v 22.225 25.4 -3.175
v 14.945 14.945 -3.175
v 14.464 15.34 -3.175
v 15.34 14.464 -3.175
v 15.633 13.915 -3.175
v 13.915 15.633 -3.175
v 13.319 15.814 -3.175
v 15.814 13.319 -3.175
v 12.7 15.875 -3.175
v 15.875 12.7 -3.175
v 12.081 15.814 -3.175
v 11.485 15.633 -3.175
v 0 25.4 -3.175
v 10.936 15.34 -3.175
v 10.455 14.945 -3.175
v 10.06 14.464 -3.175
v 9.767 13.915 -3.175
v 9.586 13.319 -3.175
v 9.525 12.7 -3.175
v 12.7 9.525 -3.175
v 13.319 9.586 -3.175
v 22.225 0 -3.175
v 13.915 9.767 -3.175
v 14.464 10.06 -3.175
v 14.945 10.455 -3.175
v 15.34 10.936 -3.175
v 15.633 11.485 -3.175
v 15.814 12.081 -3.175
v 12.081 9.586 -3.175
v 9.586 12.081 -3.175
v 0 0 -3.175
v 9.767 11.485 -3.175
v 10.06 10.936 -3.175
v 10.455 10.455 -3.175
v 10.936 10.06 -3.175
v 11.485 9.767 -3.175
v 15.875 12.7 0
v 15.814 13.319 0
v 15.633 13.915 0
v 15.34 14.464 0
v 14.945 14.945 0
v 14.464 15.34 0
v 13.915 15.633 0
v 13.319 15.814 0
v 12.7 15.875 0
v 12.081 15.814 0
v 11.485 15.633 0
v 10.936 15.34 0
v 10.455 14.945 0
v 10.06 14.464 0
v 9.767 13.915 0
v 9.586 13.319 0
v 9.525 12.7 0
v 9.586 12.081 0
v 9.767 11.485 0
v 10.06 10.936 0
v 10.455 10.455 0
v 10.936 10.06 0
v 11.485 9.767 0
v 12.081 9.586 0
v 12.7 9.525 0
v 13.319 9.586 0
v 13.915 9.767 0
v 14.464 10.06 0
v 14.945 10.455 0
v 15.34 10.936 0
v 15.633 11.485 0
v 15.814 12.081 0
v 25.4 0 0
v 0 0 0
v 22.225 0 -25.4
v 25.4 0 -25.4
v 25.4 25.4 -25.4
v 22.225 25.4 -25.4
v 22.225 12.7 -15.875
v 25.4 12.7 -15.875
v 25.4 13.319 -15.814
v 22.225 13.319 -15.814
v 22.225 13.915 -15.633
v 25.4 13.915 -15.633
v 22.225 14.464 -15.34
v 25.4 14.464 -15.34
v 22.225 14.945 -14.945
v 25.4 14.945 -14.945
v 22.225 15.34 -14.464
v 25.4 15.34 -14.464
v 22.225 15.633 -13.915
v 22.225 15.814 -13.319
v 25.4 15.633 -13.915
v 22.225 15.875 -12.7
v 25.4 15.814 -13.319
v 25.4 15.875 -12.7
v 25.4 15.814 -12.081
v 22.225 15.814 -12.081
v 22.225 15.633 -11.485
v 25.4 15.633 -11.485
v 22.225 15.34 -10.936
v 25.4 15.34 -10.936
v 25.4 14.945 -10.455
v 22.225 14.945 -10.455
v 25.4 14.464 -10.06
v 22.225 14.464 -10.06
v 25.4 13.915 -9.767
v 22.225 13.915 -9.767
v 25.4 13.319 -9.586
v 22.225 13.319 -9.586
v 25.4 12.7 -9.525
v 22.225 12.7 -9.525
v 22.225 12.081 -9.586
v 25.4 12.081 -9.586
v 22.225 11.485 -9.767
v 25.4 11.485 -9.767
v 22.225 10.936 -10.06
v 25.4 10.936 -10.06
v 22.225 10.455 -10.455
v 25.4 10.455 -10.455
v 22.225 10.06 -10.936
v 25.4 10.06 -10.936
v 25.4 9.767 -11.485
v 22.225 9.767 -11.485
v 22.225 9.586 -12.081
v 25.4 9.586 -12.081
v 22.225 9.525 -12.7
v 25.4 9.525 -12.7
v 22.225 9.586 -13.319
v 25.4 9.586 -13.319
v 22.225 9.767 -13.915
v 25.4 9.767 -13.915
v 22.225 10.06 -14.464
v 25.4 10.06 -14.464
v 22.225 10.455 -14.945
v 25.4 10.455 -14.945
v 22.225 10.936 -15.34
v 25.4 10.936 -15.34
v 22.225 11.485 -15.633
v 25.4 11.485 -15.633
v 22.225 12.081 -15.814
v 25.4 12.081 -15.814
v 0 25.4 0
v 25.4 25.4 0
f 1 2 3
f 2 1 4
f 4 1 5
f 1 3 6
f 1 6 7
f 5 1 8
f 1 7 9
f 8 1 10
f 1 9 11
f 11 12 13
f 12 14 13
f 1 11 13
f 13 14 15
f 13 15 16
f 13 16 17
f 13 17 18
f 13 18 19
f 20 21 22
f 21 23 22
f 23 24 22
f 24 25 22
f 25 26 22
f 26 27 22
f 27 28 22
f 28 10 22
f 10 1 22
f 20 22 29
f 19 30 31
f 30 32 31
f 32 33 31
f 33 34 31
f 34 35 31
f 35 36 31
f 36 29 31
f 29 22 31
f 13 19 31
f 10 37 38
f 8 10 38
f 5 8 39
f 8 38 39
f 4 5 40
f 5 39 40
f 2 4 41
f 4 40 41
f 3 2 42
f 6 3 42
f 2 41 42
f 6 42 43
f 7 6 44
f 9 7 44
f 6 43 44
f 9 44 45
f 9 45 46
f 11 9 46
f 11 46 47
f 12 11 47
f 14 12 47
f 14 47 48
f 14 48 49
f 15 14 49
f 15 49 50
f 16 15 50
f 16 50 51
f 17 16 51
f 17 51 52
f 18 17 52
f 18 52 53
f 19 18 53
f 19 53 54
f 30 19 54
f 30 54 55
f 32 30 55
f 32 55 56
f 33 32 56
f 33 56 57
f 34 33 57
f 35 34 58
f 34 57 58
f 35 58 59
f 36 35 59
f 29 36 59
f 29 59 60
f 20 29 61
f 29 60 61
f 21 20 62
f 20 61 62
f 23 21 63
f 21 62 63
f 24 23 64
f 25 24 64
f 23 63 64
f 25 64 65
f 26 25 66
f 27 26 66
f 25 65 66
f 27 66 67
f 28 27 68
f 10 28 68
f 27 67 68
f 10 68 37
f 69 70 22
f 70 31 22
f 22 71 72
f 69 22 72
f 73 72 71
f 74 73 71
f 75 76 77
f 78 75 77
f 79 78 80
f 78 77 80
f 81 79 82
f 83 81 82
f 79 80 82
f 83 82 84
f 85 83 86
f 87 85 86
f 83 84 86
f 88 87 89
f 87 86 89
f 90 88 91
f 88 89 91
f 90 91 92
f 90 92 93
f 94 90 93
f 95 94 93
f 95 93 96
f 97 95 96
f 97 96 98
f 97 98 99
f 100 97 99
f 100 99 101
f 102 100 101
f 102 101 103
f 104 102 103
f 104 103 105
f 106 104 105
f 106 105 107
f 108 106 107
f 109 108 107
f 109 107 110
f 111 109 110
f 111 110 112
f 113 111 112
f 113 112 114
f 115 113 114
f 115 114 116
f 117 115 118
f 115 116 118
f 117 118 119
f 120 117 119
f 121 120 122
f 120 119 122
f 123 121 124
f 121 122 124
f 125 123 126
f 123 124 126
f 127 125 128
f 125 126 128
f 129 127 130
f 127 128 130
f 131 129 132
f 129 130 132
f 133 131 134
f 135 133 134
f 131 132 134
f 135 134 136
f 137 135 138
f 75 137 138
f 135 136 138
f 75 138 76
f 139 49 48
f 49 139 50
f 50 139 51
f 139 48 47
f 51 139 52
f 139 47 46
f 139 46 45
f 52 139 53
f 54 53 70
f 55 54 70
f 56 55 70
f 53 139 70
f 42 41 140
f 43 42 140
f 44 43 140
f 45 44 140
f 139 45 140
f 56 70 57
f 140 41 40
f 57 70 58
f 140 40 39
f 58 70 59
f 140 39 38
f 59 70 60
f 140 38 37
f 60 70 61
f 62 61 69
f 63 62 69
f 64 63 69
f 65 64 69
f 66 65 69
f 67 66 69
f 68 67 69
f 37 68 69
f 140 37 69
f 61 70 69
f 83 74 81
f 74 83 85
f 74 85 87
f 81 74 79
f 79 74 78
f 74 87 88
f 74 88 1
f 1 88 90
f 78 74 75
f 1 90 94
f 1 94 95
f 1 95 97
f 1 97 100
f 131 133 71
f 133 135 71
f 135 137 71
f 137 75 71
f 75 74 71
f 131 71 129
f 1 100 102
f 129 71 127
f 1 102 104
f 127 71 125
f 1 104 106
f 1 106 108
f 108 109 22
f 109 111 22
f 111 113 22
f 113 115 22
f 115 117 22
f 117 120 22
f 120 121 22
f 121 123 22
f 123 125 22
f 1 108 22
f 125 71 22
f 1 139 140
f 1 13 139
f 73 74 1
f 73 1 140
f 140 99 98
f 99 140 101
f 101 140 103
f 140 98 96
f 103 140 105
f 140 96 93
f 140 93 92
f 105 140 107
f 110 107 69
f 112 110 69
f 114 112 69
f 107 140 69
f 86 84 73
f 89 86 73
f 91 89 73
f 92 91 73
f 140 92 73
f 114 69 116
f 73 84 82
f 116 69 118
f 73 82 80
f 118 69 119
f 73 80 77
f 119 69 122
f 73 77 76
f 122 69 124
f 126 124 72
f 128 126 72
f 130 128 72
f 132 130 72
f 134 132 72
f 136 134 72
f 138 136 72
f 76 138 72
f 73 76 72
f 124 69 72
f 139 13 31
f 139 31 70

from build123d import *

# Parameters (mm, degrees)
BOSS_EXTRUDE1_DEPTH = 25.4
SKETCH2_R           = 3.175
CUT_EXTRUDE1_DEPTH  = 25.4
SKETCH3_R           = 3.175
CUT_EXTRUDE2_DEPTH  = 25.4


with BuildPart() as part:
    # Sketch1 → Boss-Extrude1 (new body)
    with BuildSketch(Plane(origin=(0, 0, 0), x_dir=(1, 0, 0), z_dir=(0, 1, 0))):
        Polygon((0, 0), (25.4, 0), (25.4, 25.4), (22.225, 25.4), (22.225, 3.175), (0, 3.175), align=None)
    extrude(amount=BOSS_EXTRUDE1_DEPTH)

    # Sketch2 → Cut-Extrude1 (cut)
    with BuildSketch(Plane(origin=(25.4, 0, 0), x_dir=(0, 0, -1), z_dir=(1, 0, 0))):
        with Locations((12.7, 12.7)):
            Circle(SKETCH2_R)
    extrude(amount=-CUT_EXTRUDE1_DEPTH, mode=Mode.SUBTRACT)

    # Sketch3 → Cut-Extrude2 (cut)
    with BuildSketch(Plane.XY):
        with Locations((12.7, 12.7)):
            Circle(SKETCH3_R)
    extrude(amount=-CUT_EXTRUDE2_DEPTH, mode=Mode.SUBTRACT)


solid = part.part
